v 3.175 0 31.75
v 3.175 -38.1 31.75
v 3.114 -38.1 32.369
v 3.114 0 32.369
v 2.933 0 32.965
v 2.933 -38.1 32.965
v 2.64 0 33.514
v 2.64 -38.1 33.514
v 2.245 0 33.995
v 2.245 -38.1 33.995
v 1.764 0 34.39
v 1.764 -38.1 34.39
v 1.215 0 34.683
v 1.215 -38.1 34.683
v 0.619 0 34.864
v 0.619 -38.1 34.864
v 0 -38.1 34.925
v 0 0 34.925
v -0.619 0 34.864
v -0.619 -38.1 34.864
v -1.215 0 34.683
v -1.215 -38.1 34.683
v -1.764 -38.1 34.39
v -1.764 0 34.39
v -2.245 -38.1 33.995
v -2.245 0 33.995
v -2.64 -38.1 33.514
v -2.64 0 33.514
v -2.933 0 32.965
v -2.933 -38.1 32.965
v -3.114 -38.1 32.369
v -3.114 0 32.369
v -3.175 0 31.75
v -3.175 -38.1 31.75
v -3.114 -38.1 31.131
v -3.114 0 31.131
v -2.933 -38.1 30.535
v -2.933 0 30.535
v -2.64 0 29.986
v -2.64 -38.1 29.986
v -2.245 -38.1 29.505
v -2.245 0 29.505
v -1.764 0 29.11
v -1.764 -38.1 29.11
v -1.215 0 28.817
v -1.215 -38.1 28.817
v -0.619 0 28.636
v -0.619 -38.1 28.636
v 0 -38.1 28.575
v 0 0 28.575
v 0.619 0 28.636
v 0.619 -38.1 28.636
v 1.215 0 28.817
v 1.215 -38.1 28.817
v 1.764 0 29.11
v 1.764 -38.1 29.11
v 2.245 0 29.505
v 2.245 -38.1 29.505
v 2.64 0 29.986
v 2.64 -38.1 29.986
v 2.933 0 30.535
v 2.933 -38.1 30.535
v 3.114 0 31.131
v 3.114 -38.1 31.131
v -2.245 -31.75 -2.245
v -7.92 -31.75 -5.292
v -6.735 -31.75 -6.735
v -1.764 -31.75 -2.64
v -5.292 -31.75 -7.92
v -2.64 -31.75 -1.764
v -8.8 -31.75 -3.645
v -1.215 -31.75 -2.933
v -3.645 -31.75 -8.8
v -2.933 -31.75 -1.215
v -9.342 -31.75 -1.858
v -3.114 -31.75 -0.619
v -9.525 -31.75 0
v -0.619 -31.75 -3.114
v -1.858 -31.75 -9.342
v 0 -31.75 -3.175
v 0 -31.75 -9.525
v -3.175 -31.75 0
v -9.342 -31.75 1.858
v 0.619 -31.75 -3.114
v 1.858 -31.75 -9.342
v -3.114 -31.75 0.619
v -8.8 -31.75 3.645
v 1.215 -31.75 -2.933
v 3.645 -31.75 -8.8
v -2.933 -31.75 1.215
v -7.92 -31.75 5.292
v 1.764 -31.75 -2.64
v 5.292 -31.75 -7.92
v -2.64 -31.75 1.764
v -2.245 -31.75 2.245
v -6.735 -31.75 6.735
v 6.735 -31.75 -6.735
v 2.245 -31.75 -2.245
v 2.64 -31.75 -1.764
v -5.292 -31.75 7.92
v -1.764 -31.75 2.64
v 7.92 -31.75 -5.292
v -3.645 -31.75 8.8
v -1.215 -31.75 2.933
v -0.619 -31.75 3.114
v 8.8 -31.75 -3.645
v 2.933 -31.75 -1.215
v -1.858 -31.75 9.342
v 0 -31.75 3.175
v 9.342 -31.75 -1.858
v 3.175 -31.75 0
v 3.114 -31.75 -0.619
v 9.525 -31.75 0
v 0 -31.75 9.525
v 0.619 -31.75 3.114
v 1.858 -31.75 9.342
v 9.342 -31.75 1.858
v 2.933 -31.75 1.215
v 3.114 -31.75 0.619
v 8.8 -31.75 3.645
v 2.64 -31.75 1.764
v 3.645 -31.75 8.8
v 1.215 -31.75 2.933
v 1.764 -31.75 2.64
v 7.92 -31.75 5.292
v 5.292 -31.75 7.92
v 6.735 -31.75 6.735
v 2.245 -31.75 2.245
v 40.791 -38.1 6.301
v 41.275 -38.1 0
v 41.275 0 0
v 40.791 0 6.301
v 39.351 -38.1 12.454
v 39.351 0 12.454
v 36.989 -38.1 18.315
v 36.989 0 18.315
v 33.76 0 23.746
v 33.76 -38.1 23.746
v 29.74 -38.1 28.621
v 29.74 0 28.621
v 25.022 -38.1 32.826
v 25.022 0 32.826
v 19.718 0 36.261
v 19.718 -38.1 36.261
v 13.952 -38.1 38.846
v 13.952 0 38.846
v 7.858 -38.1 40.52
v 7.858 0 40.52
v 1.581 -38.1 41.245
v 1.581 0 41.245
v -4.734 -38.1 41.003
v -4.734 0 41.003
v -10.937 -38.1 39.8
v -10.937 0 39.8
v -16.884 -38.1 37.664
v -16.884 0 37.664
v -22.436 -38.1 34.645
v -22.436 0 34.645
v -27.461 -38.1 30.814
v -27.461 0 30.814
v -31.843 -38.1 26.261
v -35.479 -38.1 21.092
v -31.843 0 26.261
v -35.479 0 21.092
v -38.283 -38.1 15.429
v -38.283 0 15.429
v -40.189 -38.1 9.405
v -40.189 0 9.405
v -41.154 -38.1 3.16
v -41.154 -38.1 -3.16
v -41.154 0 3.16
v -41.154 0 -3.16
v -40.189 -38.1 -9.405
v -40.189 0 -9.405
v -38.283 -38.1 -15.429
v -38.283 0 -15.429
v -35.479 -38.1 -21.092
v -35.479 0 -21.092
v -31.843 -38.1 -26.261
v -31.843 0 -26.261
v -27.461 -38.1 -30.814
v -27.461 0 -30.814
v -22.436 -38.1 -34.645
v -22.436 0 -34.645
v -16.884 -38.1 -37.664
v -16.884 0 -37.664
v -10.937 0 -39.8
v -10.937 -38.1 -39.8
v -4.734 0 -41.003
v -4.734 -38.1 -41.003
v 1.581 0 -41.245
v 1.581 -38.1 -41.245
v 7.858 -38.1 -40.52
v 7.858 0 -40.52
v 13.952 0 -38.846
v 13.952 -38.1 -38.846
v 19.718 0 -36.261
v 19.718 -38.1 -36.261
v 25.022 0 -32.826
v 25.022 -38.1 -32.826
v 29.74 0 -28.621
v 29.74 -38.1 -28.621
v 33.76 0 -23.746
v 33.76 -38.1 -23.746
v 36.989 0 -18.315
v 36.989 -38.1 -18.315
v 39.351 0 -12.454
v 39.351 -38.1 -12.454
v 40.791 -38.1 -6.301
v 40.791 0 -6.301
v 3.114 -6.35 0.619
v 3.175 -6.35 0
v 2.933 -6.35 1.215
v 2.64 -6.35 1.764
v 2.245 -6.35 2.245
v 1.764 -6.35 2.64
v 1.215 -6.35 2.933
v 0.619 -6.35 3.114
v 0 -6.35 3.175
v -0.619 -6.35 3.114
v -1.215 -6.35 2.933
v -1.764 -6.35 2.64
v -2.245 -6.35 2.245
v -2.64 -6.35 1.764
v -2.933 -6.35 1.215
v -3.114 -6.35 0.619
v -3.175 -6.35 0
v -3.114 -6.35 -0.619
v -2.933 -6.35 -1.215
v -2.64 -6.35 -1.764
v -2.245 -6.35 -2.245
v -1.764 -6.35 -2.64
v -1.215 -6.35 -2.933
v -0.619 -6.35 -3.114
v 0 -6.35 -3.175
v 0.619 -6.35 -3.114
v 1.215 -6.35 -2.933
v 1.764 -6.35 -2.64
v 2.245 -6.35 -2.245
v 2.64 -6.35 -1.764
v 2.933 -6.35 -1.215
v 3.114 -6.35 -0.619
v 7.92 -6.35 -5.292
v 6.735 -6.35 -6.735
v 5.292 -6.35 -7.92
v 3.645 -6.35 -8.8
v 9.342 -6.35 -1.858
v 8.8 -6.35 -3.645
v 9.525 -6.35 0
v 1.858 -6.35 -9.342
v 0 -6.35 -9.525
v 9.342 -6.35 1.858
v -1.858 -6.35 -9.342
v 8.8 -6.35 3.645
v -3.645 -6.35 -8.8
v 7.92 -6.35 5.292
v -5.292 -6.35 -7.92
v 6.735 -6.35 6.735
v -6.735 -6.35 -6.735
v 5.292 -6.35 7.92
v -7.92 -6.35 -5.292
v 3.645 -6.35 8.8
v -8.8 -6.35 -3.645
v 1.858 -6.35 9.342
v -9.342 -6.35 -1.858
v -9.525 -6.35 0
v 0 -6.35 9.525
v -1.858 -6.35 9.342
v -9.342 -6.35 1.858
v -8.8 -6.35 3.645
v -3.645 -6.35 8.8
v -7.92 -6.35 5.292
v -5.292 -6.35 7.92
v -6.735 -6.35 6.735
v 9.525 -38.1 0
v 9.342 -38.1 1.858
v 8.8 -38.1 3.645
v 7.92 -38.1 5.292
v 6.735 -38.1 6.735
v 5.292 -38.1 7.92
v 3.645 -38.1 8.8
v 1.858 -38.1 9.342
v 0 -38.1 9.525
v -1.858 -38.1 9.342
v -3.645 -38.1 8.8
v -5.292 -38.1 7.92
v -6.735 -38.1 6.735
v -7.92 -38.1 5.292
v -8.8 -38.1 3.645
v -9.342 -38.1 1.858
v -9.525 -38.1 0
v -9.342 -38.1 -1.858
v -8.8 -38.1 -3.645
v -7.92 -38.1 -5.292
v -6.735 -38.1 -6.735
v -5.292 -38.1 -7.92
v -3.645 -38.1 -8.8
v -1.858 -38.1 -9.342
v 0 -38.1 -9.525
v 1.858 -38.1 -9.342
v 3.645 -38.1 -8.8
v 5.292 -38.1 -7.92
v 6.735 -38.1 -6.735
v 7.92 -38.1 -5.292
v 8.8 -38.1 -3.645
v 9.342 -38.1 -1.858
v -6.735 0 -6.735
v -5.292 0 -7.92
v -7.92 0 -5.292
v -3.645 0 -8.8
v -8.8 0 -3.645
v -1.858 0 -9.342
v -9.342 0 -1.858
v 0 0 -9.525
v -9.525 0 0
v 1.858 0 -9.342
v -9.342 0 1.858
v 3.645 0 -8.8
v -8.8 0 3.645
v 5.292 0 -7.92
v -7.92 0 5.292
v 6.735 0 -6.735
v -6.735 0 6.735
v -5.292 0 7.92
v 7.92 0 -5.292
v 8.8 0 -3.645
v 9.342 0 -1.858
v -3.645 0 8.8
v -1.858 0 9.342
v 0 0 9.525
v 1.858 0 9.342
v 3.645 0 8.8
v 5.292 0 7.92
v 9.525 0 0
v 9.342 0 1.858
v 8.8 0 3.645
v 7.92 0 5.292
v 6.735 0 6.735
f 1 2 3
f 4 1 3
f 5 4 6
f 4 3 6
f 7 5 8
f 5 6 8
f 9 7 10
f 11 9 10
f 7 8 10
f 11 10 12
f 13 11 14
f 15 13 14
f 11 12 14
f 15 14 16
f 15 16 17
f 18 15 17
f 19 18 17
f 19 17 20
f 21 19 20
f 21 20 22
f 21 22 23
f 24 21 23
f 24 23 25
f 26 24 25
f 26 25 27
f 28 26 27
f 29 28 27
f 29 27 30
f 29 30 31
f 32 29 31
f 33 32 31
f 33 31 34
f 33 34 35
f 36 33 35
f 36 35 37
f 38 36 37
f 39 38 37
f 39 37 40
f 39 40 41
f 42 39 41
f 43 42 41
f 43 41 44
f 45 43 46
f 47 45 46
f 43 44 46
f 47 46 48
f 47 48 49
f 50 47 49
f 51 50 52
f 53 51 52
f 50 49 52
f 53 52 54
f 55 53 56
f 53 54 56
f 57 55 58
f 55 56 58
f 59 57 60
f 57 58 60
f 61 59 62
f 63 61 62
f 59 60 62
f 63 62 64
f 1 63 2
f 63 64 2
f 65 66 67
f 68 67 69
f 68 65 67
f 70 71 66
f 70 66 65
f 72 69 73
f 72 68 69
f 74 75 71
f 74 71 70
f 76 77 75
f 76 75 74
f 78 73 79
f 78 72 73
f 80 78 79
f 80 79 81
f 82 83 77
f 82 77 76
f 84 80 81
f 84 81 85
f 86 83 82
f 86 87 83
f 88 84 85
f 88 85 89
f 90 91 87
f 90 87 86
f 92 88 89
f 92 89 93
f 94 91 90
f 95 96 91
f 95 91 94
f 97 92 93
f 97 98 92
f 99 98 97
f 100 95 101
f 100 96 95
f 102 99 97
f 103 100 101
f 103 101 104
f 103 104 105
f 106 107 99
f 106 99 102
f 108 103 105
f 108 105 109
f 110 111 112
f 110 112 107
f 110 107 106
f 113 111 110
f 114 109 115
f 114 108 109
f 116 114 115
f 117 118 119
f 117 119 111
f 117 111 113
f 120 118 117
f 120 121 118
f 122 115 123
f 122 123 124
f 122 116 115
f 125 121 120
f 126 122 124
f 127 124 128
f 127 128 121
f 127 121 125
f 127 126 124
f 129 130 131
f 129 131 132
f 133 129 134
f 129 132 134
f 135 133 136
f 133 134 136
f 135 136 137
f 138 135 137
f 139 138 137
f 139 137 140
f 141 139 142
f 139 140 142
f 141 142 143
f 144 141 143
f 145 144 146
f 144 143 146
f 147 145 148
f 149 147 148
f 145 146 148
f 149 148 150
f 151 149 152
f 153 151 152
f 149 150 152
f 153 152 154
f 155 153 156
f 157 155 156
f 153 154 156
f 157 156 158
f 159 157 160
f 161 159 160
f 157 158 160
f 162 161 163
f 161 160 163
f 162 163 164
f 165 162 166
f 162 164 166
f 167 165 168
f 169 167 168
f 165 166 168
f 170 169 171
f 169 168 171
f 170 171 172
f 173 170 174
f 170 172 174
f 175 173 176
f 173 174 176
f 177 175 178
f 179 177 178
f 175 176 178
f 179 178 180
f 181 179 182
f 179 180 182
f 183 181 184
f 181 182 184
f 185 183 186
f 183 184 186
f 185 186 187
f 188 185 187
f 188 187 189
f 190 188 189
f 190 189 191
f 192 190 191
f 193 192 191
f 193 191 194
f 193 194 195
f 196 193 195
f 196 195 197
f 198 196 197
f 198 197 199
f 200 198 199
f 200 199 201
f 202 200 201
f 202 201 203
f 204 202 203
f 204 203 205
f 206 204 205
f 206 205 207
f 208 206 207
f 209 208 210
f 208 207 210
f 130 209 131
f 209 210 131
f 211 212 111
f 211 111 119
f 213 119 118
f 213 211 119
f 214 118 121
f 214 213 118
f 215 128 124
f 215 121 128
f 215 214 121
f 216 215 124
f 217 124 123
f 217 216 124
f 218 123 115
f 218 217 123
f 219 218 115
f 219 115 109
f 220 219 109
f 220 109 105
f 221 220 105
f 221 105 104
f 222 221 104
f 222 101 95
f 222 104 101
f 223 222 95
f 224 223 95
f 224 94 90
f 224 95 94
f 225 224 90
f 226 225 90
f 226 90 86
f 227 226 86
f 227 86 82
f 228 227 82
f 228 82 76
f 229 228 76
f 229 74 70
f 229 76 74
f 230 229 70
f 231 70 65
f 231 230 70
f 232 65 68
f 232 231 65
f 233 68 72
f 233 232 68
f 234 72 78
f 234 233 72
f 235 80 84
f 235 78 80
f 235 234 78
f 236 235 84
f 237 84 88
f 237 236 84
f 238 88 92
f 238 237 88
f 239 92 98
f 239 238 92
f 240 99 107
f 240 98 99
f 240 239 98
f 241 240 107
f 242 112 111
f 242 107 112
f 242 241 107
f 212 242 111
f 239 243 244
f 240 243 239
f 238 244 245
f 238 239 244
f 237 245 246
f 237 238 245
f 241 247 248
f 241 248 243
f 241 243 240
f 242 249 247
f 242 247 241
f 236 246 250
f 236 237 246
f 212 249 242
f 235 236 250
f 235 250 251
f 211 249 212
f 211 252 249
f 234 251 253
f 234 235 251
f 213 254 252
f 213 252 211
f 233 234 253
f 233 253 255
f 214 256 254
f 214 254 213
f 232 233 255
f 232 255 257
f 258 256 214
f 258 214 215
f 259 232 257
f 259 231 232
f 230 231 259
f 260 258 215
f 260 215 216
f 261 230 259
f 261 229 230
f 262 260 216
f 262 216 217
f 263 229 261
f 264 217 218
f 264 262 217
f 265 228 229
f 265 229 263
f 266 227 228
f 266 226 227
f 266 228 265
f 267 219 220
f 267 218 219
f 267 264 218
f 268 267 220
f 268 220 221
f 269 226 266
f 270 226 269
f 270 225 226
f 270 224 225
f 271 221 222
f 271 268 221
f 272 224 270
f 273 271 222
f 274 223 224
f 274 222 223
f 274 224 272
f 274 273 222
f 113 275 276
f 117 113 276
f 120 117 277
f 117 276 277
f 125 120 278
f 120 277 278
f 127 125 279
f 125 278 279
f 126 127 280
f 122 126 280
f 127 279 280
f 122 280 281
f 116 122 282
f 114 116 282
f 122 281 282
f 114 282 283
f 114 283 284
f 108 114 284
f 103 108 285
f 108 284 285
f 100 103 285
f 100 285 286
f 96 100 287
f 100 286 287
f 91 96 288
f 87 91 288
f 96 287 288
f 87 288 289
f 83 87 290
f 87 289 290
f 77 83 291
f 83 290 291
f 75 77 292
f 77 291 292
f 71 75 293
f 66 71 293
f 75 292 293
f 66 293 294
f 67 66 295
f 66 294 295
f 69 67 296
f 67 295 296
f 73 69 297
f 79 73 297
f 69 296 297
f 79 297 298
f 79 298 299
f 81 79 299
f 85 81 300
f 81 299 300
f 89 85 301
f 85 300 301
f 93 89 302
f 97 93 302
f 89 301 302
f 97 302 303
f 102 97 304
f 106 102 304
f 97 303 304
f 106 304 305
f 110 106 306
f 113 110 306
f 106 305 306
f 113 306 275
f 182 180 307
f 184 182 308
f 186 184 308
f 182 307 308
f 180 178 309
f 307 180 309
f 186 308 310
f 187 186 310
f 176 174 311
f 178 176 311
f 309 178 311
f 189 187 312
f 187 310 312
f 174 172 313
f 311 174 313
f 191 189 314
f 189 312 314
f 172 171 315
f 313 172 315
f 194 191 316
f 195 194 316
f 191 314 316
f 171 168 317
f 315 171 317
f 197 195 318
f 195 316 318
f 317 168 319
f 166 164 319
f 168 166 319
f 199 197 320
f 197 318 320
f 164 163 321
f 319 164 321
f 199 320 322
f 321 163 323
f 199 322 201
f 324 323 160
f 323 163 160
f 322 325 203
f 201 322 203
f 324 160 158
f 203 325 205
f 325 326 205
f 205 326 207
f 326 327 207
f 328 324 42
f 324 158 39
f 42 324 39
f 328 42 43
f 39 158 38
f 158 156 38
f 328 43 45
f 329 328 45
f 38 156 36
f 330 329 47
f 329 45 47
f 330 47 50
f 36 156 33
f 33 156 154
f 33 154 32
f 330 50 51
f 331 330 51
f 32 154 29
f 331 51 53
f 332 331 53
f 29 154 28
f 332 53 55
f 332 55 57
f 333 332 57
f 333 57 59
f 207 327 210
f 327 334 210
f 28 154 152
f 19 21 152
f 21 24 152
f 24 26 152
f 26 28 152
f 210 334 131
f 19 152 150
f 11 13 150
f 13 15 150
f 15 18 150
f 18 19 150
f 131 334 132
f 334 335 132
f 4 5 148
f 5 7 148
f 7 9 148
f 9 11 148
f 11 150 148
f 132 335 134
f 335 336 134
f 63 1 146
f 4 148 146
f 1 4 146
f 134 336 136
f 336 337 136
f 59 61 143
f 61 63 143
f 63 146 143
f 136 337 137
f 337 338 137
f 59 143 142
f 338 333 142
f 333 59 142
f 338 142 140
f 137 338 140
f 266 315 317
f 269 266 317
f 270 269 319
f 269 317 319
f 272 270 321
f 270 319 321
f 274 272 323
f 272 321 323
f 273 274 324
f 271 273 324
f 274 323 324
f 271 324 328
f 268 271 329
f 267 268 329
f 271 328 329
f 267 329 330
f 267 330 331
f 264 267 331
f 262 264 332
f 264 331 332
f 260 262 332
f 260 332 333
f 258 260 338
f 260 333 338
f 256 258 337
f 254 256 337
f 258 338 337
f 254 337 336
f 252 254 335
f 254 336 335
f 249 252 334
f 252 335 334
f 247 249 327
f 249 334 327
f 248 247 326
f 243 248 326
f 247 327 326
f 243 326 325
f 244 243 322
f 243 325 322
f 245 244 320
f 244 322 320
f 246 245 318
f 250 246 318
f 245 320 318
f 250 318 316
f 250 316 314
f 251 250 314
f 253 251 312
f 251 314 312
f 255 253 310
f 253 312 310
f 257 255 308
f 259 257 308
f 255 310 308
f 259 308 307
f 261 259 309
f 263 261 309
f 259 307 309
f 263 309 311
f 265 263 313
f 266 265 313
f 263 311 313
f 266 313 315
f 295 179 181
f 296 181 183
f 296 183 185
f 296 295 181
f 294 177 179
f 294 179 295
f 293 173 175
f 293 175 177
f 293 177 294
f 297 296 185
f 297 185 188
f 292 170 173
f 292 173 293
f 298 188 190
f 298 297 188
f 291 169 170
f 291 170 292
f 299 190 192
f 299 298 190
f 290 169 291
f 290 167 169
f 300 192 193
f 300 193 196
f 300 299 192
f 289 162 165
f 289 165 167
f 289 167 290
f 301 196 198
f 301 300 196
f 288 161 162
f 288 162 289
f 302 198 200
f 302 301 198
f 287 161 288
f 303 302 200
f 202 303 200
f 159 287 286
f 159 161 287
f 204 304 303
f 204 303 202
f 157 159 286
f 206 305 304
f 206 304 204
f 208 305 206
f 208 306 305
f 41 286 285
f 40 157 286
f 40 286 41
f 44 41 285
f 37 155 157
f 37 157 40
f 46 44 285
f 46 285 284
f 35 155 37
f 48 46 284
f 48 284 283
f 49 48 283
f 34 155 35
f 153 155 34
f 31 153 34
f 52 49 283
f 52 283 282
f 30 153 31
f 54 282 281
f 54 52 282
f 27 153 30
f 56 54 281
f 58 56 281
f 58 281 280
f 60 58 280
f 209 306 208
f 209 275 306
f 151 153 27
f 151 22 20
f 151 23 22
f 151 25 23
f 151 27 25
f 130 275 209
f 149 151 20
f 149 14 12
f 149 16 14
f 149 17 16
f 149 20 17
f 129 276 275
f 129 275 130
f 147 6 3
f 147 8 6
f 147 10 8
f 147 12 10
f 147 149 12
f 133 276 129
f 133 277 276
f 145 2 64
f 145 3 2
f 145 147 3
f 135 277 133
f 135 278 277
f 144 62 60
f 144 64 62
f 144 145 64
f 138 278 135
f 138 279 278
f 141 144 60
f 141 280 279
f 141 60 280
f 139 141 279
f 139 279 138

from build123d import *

# Parameters (mm, degrees)
F0_R     = 41.275
F0_R_2   = 3.175
F1_DEPTH = 38.1
F2_R     = 3.175
F3_DEPTH = 38.101
F4_R     = 9.525
F4_R_2   = 3.175
F5_DEPTH = 6.35
F6_R     = 9.525
F7_DEPTH = 6.35


with BuildPart() as f1:
    # F0 (on Front) → F1 (new body)
    with BuildSketch(Plane.XZ):
        Circle(F0_R)
        Circle(F0_R_2, mode=Mode.SUBTRACT)
    extrude(amount=F1_DEPTH)

    # F2 (on face) → F3 (cut, through all)
    with BuildSketch(Plane.XZ.offset(38.1)):
        with Locations((0, 31.75)):
            Circle(F2_R)
    extrude(amount=-F3_DEPTH, mode=Mode.SUBTRACT)

    # F4 (on face) → F5 (cut)
    with BuildSketch(Plane(origin=(0, 0, 0), x_dir=(-1, 0, 0), z_dir=(0, 1, 0))):
        Circle(F4_R)
        Circle(F4_R_2, mode=Mode.SUBTRACT)
    extrude(amount=-F5_DEPTH, mode=Mode.SUBTRACT)

    # F6 (on face) → F7 (cut)
    with BuildSketch(Plane.XZ.offset(38.1)):
        Circle(F6_R)
    extrude(amount=-F7_DEPTH, mode=Mode.SUBTRACT)


solid = f1.part
